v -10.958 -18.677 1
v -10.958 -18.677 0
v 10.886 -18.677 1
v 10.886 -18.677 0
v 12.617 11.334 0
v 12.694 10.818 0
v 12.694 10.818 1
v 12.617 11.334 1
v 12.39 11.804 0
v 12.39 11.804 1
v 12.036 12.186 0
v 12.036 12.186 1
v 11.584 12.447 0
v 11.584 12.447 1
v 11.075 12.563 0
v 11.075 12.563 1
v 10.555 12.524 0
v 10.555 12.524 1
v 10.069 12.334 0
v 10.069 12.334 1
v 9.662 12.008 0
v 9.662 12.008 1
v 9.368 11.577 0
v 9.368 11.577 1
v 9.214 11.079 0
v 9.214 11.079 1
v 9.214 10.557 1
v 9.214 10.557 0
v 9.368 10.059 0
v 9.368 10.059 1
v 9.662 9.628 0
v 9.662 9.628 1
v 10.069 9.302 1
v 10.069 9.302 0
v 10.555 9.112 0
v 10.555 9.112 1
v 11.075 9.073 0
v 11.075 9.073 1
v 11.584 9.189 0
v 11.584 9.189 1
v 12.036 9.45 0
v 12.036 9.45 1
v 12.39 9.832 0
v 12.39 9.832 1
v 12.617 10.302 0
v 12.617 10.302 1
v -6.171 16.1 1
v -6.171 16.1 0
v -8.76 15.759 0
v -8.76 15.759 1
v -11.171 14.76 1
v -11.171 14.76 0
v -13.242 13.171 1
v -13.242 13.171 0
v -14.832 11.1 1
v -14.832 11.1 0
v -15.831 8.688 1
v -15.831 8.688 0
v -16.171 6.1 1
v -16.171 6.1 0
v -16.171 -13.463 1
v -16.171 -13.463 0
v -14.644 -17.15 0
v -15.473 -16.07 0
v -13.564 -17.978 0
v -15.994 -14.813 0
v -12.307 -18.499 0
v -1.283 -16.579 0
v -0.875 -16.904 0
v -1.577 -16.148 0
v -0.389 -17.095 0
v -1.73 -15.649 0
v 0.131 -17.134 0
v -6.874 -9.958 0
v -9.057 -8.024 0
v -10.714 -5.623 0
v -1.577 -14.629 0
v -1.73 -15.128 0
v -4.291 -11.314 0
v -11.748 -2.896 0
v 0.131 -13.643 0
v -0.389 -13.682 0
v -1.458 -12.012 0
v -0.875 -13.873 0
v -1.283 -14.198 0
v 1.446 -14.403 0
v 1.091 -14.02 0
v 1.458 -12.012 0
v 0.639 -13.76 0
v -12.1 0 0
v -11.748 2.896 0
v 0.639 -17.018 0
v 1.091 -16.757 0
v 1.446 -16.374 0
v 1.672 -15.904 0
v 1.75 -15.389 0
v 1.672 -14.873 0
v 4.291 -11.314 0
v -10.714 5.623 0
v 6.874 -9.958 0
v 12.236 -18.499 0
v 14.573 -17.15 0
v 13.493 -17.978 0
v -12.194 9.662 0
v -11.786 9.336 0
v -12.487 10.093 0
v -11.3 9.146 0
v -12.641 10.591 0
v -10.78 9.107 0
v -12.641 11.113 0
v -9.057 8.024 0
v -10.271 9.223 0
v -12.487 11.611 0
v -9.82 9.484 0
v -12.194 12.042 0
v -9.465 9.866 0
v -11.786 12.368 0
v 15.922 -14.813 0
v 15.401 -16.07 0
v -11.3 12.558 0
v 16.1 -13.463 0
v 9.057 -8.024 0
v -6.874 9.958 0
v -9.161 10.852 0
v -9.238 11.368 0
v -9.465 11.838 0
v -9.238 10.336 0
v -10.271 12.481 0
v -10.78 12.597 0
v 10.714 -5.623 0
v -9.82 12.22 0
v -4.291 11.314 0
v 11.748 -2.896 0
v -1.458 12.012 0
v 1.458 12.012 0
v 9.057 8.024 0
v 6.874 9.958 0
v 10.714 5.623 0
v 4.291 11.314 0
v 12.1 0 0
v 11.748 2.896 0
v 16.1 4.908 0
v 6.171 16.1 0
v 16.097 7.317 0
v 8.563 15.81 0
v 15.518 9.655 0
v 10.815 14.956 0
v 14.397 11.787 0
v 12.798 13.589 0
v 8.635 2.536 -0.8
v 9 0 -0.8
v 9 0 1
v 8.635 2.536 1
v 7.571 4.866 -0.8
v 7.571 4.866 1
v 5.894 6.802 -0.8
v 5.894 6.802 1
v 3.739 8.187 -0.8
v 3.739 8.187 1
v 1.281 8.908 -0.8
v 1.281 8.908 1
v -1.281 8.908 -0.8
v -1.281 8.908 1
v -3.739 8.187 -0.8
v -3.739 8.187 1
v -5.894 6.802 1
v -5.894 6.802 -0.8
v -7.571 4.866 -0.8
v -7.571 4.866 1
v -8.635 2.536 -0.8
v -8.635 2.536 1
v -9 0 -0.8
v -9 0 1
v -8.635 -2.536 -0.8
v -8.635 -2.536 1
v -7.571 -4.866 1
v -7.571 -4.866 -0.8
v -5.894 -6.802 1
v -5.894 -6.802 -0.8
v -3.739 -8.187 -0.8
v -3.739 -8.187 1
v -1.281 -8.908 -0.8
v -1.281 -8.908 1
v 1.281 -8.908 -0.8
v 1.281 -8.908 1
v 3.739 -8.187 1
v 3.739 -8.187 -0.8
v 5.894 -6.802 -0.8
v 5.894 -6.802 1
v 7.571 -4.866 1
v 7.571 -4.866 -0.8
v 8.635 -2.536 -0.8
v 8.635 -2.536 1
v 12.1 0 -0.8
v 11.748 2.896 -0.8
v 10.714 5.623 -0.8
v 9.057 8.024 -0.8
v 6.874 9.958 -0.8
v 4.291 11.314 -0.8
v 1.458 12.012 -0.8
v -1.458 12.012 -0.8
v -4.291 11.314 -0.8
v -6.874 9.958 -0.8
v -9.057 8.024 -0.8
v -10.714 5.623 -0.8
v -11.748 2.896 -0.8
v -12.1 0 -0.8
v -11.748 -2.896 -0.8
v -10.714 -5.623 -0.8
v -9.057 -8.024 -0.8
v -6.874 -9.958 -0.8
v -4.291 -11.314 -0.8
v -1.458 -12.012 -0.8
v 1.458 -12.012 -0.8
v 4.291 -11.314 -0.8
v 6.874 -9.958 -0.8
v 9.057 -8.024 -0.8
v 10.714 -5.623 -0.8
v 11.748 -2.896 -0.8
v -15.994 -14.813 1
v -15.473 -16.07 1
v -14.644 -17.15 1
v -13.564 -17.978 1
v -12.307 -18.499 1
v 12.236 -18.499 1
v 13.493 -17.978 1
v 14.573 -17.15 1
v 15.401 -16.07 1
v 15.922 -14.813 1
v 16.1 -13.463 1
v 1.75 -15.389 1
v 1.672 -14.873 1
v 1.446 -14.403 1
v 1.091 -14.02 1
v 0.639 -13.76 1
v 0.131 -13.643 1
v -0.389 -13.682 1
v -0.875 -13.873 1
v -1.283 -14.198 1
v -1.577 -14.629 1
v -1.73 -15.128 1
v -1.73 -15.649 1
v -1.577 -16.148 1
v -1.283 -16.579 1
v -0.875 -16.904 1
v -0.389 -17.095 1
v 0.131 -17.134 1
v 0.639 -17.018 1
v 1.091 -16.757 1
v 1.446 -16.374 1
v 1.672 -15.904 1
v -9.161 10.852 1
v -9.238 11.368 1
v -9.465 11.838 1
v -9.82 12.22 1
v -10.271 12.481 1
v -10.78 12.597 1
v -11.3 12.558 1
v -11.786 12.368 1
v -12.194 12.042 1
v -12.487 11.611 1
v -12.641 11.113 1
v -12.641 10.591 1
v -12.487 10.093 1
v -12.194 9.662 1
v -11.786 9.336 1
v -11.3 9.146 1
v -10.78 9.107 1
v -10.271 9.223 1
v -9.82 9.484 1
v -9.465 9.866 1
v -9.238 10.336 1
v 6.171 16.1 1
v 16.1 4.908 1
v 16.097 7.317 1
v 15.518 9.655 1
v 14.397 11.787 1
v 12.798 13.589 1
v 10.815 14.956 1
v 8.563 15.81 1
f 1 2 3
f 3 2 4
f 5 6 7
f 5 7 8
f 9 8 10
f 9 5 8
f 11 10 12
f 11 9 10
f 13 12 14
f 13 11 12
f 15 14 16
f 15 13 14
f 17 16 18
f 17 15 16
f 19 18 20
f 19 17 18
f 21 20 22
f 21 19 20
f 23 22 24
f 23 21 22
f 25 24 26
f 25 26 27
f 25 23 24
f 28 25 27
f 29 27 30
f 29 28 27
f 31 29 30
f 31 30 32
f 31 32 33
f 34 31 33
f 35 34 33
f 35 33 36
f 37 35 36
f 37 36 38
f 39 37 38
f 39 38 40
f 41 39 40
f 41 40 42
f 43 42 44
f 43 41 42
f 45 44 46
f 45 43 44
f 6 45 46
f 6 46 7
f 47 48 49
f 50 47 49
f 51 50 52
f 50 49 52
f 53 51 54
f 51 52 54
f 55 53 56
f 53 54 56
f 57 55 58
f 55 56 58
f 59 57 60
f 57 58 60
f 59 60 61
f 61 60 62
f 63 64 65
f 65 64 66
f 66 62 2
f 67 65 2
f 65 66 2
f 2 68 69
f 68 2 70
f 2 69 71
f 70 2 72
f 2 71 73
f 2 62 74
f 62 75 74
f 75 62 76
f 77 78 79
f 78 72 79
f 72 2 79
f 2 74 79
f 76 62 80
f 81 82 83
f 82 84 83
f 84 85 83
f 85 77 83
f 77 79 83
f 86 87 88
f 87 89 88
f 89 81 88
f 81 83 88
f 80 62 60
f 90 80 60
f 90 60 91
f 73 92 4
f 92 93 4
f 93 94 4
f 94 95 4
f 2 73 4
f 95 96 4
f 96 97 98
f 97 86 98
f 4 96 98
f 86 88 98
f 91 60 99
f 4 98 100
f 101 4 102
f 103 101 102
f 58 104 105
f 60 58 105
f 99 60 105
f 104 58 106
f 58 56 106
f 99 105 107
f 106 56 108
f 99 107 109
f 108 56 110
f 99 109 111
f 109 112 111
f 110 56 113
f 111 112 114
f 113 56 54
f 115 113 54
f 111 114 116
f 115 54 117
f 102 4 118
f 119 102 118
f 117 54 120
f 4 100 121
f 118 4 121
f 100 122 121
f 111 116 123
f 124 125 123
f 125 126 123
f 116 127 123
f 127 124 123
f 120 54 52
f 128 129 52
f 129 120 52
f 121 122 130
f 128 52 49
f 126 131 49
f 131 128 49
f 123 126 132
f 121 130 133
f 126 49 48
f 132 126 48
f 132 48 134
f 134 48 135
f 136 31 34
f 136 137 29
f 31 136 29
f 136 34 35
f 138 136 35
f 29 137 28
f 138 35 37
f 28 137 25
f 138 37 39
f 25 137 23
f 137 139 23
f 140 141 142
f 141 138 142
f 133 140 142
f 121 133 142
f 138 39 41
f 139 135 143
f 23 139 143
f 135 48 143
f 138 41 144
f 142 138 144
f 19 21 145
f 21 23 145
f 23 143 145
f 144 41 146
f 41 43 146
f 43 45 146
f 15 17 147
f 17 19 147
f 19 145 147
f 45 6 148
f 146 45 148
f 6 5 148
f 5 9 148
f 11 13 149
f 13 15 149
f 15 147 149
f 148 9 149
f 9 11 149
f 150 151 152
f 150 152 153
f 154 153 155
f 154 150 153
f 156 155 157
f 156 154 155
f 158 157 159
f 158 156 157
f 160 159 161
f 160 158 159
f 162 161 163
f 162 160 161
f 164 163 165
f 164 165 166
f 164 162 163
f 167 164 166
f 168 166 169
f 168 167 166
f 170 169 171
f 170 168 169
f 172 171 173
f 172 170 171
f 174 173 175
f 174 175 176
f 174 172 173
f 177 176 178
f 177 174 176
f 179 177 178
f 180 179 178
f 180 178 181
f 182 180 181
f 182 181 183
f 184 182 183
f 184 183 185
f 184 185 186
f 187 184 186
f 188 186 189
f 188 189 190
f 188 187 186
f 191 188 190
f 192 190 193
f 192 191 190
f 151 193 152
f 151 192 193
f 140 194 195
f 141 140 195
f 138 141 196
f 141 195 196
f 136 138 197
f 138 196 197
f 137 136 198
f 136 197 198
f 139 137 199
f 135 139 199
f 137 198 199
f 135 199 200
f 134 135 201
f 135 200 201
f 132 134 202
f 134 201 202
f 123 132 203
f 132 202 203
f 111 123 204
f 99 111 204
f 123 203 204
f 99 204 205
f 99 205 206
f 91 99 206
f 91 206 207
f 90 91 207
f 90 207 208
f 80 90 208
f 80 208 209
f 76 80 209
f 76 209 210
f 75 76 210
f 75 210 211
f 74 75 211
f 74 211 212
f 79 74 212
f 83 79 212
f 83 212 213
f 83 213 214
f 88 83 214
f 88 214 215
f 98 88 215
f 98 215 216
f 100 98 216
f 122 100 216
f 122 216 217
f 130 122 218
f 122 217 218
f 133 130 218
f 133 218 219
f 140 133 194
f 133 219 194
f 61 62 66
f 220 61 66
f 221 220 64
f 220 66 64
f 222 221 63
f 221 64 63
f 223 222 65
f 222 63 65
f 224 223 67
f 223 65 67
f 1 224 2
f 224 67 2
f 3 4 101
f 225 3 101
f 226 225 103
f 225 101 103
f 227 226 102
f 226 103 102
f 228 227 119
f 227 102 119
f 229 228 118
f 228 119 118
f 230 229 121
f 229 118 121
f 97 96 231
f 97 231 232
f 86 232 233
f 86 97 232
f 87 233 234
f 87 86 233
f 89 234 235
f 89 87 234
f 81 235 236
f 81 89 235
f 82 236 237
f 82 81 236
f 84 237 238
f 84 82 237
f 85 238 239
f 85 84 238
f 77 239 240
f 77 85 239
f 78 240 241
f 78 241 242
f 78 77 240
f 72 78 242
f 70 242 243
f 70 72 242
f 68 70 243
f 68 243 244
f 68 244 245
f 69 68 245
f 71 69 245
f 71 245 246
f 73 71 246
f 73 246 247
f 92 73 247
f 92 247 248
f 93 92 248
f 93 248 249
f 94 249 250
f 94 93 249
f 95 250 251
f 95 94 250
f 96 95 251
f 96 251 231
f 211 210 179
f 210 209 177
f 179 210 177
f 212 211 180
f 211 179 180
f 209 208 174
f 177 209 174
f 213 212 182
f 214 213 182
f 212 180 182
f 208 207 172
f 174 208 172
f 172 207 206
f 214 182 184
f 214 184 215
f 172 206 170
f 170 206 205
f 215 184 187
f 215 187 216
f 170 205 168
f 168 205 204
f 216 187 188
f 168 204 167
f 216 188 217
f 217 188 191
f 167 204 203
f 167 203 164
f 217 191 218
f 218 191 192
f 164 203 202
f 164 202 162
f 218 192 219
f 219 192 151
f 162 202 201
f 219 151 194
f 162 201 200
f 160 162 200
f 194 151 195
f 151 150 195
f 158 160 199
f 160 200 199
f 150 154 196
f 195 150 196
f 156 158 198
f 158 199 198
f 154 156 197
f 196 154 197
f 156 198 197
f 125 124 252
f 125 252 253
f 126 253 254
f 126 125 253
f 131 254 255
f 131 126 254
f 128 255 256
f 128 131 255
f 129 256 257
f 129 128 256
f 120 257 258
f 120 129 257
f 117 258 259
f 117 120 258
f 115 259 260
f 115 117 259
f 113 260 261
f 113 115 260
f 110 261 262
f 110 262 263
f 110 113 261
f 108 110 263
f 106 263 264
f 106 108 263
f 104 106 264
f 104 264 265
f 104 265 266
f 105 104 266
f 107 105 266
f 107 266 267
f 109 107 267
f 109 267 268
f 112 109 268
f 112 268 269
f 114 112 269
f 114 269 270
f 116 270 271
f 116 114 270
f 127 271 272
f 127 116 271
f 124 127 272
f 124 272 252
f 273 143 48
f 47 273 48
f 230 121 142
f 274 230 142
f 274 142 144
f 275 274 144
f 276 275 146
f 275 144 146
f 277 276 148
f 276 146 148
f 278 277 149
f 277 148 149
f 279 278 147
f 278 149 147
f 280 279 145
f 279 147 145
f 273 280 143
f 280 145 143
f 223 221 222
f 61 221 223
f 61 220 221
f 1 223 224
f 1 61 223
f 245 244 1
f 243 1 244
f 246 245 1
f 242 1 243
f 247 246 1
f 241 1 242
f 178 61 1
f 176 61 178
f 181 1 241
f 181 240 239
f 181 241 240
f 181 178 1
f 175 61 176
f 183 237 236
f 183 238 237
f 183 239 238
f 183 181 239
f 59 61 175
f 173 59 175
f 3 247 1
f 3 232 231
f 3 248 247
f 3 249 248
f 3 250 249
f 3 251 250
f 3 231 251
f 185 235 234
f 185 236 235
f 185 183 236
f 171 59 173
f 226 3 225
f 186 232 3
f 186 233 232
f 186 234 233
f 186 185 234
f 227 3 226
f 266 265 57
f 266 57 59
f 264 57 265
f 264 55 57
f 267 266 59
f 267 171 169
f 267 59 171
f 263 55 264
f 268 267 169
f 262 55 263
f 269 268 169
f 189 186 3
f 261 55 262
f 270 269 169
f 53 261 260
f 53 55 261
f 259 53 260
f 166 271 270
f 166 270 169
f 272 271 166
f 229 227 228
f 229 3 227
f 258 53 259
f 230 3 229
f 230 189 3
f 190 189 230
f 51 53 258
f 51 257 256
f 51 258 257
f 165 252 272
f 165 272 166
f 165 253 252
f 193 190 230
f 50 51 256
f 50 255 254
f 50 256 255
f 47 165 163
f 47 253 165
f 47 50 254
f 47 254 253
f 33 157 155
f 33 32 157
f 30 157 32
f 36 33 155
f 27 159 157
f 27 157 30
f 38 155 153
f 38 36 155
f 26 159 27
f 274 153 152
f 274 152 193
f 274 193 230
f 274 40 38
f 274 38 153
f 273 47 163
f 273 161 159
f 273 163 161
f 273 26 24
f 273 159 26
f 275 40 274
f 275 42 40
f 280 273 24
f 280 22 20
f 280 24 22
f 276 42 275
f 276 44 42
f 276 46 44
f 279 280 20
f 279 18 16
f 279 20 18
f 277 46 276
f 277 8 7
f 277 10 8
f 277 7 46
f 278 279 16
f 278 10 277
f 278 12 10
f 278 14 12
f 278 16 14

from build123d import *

# Parameters (mm, degrees)
SCHIZZO1_R                   = 1.75
SCHIZZO1_R_2                 = 12.1
ESTRUSIONE_ESTRUSIONE1_DEPTH = 1
ESTRUSIONE_ESTRUSIONE2_START = -1.8
SCHIZZO2_R                   = 12.1
SCHIZZO2_R_2                 = 9
ESTRUSIONE_ESTRUSIONE2_DEPTH = 1.8


with BuildPart() as part:
    # Schizzo1 → Estrusione-Estrusione1 (new body)
    with BuildSketch(Plane.XY):
        with BuildLine():
            Line((-10.957517396, -18.677002221), (10.886206072, -18.677002221))
            ThreePointArc((10.886206072, -18.677002221), (14.572915114, -17.149917336), (16.1, -13.463208293))
            Line((16.1, -13.463208293), (16.1, 4.907883736))
            ThreePointArc((16.1, 4.907883736), (13.651991863, 12.73622021), (6.171311325, 16.1))
            Line((6.171311325, 16.1), (-6.171311325, 16.1))
            ThreePointArc((-6.171311325, 16.1), (-13.242379137, 13.171067812), (-16.171311325, 6.1))
            Line((-16.171311325, 6.1), (-16.171311325, -13.463208293))
            ThreePointArc((-16.171311325, -13.463208293), (-14.644226439, -17.149917336), (-10.957517396, -18.677002221))
        make_face()
        with Locations((0, -15.38859776)):
            Circle(SCHIZZO1_R, mode=Mode.SUBTRACT)
        with Locations((10.944459062, 10.817992606)):
            Circle(SCHIZZO1_R, mode=Mode.SUBTRACT)
        with Locations((-10.910719744, 10.851964601)):
            Circle(SCHIZZO1_R, mode=Mode.SUBTRACT)
        Circle(SCHIZZO1_R_2, mode=Mode.SUBTRACT)
    extrude(amount=ESTRUSIONE_ESTRUSIONE1_DEPTH)

    # Schizzo2 → Estrusione-Estrusione2 (add)
    with BuildSketch(Plane.XY.offset(1).offset(ESTRUSIONE_ESTRUSIONE2_START)):
        Circle(SCHIZZO2_R)
        Circle(SCHIZZO2_R_2, mode=Mode.SUBTRACT)
    extrude(amount=ESTRUSIONE_ESTRUSIONE2_DEPTH)


solid = part.part
